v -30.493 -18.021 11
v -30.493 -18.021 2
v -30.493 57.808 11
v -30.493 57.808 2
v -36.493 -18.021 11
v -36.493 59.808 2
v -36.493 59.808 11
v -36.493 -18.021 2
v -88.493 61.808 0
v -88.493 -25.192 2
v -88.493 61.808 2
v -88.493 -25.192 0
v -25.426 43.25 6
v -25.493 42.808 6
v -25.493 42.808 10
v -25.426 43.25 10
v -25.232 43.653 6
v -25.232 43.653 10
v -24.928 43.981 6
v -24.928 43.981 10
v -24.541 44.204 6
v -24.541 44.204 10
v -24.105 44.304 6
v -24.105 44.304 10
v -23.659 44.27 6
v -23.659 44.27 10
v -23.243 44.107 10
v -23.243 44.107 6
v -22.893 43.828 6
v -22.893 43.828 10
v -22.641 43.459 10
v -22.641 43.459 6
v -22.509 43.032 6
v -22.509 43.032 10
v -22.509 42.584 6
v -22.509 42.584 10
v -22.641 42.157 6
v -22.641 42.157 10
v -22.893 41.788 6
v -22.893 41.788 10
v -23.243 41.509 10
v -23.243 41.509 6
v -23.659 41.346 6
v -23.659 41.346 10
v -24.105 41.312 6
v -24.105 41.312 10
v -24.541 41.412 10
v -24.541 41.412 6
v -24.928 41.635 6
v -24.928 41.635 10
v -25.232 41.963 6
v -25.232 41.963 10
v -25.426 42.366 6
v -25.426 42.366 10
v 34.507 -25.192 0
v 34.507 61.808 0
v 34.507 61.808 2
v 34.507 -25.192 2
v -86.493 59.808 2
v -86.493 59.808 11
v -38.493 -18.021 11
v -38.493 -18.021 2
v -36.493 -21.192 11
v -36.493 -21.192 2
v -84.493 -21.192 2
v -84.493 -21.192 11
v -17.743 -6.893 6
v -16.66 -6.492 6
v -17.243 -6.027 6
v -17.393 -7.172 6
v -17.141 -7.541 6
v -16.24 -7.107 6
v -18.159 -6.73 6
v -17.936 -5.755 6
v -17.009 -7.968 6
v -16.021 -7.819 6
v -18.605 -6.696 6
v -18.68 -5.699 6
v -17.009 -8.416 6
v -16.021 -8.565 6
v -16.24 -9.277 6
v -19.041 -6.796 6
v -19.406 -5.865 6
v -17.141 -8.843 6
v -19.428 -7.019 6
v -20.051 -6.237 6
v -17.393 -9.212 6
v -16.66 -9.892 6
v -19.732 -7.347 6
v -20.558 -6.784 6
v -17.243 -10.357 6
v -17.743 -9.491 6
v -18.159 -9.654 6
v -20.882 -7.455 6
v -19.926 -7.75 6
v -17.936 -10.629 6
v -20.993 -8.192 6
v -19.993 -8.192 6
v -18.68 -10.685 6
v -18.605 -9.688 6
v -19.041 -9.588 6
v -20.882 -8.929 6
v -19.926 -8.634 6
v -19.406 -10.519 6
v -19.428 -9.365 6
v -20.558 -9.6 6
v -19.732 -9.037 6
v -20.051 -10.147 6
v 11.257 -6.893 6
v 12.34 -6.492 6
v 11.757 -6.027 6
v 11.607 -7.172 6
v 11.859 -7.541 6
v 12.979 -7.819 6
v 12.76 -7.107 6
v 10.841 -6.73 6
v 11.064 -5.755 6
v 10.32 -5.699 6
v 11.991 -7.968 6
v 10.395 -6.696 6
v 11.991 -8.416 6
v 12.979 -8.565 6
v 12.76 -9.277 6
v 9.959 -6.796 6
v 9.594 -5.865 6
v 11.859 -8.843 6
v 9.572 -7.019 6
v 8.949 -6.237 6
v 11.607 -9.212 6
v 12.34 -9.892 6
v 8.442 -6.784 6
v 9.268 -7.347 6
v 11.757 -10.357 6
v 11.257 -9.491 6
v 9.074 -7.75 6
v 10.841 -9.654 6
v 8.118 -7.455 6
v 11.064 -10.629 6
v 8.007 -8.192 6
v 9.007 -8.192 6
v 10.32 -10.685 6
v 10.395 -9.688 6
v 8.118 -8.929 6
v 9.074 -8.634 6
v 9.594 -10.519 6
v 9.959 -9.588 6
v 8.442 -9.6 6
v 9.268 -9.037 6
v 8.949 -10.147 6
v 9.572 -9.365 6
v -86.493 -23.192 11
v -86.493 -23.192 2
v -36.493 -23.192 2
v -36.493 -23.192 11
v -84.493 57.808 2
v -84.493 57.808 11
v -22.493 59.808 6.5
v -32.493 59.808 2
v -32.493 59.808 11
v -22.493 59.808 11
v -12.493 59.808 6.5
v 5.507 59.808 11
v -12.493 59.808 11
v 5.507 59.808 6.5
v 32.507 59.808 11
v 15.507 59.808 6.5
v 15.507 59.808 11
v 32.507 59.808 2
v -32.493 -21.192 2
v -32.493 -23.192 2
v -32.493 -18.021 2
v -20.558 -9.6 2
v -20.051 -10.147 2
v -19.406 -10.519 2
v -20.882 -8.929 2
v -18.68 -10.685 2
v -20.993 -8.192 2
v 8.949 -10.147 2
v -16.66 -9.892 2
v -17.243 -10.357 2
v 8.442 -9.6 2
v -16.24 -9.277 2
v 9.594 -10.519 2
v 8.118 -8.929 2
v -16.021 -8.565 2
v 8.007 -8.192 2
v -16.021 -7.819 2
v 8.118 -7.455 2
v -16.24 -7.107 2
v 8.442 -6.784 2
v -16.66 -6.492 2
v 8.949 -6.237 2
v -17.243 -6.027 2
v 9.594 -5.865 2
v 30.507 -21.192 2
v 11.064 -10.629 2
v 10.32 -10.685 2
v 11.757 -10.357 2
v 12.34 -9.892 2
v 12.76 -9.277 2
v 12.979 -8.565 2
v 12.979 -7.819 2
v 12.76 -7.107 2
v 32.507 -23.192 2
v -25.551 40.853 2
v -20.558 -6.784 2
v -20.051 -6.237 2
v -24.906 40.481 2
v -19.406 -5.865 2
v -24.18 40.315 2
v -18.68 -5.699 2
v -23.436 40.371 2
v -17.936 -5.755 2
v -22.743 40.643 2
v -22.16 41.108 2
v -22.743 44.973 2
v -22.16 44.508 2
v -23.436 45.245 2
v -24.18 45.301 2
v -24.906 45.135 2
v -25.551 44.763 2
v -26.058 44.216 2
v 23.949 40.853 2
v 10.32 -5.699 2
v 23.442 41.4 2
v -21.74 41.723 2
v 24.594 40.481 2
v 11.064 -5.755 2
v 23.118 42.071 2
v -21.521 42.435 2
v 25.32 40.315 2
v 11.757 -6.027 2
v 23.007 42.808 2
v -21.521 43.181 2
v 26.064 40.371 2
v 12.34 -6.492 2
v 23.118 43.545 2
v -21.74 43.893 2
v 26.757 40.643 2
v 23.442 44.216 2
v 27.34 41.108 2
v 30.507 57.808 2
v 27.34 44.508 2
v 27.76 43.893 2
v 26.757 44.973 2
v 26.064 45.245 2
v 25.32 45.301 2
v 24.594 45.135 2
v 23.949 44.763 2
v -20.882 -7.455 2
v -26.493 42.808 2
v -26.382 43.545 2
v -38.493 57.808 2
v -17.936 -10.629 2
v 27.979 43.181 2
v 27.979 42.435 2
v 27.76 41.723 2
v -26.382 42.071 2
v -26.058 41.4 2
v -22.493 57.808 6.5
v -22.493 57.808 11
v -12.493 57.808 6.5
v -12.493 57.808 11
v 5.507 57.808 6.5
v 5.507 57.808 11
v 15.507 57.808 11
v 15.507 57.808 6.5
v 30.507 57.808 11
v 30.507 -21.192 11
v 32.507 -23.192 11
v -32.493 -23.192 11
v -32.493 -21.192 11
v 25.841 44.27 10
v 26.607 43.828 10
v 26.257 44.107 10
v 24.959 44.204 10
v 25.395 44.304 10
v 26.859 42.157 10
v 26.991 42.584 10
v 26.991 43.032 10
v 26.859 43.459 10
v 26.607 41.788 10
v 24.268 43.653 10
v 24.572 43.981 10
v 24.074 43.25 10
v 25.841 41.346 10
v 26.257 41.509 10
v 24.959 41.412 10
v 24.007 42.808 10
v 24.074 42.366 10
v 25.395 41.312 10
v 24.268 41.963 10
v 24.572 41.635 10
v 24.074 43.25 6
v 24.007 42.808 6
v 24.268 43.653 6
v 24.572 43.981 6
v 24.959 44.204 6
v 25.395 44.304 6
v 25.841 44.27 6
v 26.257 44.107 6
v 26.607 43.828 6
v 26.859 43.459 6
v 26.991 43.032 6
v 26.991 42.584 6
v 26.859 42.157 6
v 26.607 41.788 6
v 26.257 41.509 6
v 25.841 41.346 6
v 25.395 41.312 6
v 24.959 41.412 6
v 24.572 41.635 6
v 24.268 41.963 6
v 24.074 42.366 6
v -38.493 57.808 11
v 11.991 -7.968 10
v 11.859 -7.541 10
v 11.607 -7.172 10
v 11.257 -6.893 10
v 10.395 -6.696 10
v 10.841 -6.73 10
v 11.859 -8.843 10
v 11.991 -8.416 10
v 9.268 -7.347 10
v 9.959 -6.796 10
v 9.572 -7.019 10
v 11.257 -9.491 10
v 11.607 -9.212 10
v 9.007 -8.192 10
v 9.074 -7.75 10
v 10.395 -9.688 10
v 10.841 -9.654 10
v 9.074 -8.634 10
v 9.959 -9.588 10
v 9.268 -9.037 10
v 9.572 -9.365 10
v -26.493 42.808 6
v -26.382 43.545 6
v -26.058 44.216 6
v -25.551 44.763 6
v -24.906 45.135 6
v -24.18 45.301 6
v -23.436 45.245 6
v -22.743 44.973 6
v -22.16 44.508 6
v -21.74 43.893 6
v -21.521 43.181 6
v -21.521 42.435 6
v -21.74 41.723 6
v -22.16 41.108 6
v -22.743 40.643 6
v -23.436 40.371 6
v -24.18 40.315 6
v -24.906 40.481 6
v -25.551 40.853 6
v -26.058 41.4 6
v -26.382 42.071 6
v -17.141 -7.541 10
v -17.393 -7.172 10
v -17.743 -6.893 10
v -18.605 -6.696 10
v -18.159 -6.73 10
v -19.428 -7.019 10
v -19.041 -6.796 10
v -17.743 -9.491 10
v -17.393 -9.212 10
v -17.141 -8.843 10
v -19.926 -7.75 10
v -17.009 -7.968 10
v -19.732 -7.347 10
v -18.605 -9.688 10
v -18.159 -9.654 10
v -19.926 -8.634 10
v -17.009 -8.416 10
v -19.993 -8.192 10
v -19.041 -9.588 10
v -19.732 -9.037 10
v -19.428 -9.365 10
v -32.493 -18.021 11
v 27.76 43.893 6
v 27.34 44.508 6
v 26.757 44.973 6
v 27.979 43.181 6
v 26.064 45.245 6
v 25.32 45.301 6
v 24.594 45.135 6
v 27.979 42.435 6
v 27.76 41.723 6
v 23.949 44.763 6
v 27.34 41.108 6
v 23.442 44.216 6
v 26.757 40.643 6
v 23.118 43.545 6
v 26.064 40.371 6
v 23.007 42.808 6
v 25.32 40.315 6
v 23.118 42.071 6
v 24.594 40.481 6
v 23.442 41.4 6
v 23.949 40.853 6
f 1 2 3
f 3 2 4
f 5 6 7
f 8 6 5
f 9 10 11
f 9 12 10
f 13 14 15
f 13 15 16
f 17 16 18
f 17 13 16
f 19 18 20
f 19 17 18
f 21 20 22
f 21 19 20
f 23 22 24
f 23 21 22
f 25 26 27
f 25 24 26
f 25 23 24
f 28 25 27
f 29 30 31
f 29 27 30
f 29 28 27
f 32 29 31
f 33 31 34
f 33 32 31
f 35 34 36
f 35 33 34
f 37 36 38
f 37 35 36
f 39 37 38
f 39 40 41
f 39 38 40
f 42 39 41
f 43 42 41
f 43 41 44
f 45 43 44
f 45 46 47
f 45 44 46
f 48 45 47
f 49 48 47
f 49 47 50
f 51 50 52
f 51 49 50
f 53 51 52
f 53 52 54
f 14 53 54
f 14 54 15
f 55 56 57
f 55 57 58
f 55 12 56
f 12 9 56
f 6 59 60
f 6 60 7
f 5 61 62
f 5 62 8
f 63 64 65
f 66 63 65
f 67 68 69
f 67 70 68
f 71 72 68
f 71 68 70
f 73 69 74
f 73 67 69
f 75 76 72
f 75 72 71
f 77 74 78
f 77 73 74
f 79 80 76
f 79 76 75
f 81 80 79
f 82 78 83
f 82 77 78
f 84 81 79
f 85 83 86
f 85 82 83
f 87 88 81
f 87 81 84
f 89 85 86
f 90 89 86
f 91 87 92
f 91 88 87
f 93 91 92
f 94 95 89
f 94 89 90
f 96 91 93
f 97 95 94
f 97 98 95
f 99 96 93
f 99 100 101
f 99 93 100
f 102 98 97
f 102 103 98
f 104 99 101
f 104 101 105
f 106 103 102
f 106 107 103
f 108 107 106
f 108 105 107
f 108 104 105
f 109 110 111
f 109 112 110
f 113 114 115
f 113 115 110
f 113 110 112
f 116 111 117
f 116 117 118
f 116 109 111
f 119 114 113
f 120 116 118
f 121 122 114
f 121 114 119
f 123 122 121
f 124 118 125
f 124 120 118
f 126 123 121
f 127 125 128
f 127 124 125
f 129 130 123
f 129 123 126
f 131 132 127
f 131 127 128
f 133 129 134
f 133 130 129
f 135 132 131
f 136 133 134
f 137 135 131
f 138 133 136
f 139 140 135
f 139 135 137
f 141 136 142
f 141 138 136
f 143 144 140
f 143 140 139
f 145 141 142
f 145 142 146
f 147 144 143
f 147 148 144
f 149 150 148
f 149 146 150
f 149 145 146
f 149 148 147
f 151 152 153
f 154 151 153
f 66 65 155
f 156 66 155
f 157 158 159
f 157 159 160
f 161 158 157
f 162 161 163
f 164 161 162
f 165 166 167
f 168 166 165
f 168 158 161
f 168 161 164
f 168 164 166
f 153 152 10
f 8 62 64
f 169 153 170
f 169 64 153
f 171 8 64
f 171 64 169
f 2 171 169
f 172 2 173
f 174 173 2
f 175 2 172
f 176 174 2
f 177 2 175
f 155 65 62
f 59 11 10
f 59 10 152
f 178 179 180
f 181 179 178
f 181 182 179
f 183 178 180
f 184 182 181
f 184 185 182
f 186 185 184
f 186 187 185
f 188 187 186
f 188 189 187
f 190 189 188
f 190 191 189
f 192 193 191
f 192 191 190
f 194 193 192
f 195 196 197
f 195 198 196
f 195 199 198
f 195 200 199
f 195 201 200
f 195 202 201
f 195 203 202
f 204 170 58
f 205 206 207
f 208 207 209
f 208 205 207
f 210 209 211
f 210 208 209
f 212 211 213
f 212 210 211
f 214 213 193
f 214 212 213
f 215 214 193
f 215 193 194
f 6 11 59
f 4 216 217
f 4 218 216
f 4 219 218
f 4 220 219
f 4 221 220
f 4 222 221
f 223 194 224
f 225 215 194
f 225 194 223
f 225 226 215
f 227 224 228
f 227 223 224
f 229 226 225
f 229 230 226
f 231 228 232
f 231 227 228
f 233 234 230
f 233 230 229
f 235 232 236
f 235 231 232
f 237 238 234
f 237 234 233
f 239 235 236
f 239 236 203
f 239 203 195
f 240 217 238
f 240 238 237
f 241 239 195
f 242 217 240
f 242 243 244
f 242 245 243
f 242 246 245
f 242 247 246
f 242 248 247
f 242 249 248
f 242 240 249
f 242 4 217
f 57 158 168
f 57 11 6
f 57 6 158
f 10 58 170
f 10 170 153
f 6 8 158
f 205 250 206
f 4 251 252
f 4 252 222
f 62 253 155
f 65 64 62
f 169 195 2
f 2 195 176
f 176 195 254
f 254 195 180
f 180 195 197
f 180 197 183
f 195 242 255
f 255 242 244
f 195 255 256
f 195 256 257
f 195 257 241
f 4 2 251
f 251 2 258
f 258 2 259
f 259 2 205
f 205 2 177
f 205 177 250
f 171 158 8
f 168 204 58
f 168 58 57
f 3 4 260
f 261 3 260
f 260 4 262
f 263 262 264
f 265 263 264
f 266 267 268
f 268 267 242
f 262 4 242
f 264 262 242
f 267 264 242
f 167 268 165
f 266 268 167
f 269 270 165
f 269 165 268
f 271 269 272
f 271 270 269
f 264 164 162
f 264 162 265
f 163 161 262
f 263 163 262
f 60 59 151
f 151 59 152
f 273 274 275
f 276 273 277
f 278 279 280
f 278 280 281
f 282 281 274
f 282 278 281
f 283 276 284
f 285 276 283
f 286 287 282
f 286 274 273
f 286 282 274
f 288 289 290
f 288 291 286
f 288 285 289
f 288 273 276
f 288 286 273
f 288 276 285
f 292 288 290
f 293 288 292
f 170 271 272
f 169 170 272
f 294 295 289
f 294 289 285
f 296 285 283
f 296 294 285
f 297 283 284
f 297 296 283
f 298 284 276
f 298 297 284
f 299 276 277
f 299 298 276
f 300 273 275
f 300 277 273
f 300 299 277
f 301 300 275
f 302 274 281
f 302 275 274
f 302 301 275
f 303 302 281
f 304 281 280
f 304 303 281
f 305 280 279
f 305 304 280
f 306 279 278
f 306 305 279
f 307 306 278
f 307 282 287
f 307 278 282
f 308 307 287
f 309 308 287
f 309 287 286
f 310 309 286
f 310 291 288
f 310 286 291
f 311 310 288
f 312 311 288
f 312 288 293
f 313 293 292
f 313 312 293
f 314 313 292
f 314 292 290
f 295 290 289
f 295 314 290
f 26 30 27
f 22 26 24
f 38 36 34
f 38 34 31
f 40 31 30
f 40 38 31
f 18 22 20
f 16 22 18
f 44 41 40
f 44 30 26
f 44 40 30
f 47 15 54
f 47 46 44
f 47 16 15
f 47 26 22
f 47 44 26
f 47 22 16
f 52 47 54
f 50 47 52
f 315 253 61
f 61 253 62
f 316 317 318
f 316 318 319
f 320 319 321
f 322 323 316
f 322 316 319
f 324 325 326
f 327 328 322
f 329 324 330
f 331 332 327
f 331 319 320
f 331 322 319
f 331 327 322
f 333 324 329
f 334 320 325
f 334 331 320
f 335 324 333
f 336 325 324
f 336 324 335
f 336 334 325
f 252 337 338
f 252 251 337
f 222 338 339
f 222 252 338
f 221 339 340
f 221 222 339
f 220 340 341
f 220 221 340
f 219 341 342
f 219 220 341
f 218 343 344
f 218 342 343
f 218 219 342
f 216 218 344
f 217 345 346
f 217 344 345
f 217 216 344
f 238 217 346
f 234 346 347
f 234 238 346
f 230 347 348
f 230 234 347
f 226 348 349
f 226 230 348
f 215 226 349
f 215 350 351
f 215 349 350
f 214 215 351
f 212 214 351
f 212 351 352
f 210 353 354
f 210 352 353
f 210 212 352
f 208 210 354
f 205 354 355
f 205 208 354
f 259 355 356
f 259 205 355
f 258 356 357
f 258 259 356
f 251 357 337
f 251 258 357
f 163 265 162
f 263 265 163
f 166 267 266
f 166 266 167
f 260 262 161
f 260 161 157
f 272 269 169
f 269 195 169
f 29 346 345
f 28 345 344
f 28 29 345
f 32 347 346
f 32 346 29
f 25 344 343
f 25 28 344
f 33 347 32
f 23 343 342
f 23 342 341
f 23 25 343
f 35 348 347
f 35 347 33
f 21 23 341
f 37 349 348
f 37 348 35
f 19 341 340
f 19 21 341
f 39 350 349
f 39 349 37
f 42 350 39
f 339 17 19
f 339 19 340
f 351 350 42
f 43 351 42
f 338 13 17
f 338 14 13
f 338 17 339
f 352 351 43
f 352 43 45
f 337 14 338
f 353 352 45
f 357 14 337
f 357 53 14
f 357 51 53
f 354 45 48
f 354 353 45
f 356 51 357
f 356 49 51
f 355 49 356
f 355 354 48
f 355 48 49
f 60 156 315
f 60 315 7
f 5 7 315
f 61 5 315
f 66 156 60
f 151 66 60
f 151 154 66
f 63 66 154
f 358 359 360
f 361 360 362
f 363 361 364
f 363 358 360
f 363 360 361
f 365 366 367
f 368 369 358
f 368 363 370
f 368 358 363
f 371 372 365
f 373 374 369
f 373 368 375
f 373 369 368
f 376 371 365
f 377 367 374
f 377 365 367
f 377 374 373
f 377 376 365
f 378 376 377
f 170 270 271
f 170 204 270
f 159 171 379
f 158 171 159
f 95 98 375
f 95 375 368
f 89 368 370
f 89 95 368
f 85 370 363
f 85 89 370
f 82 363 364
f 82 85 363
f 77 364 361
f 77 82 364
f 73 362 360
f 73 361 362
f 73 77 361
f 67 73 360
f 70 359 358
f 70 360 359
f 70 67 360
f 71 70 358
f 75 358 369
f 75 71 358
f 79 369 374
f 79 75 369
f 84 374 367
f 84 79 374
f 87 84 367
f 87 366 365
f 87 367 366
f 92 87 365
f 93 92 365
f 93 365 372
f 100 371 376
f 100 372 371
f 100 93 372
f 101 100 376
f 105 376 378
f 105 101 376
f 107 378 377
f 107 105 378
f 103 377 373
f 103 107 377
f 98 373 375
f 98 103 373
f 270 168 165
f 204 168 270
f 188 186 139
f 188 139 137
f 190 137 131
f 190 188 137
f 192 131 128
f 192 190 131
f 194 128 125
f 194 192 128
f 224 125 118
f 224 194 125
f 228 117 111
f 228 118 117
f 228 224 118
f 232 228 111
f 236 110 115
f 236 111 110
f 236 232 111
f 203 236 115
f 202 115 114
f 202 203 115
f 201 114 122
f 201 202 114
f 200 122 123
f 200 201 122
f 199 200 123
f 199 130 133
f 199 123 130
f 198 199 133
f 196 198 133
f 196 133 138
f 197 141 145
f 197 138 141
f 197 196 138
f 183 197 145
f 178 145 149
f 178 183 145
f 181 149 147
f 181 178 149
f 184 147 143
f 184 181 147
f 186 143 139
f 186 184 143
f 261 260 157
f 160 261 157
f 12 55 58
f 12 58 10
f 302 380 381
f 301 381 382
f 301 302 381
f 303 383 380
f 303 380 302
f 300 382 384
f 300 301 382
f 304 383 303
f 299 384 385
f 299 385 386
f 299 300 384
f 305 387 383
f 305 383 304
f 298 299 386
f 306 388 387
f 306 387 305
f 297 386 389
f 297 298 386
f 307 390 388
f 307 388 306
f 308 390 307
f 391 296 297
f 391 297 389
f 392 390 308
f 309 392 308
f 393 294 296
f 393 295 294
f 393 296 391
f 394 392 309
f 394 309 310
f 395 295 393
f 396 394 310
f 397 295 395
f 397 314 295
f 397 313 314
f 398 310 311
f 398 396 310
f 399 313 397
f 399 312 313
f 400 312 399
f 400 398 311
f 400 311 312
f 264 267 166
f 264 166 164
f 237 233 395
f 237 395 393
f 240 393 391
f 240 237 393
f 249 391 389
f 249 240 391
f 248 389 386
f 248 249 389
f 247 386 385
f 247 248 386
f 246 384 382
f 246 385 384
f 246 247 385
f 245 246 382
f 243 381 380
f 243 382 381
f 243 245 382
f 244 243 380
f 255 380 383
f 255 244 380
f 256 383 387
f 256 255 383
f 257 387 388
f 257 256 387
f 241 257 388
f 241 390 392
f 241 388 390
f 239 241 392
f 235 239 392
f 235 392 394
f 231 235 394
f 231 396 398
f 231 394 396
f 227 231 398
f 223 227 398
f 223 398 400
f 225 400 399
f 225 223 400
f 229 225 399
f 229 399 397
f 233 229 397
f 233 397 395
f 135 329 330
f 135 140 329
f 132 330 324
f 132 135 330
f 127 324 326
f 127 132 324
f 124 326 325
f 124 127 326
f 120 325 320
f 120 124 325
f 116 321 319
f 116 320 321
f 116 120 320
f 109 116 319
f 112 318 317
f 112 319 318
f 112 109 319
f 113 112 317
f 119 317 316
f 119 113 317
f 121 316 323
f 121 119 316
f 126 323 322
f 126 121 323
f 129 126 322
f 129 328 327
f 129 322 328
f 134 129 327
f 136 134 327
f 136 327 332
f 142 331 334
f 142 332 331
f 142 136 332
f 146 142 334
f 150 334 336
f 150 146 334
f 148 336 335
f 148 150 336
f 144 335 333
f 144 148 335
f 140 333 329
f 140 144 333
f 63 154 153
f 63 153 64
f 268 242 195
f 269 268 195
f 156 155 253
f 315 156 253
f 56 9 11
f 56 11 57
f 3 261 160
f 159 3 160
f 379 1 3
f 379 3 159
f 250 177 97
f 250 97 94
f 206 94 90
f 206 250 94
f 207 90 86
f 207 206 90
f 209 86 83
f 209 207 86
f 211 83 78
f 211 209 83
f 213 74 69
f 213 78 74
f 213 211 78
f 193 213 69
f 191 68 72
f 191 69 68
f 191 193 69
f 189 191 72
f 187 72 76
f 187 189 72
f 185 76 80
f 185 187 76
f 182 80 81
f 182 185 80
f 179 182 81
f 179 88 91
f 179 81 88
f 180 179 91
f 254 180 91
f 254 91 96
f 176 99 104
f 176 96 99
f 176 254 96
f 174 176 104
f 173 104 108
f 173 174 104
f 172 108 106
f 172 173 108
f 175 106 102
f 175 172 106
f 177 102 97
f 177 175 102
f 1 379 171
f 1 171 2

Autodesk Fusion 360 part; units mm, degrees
sketch "Sketch1" plane through (0, 0, 0) normal (0, 0, 1) x (1, 0, 0)
  line L0 (-88.4927, 61.808) -> (34.5073, 61.808)
  line L1 (34.5073, 61.808) -> (34.5073, -25.192)
  line L2 (34.5073, -25.192) -> (-88.4927, -25.192)
  line L3 (-88.4927, -25.192) -> (-88.4927, 61.808)
  dimension "d1" = 123
  dimension "d2" = 87
extrude "Extrude1" add sketch "Sketch1" along normal blind 2
sketch "Sketch2" plane through (0, 0, 2) normal (0, 0, 1) x (-1, 0, 0)
  line L0 (88.4927, 25.192) -> (-34.5073, 25.192)
  line L1 (-34.5073, 25.192) -> (-34.5073, -61.808)
  line L2 (-34.5073, -61.808) -> (88.4927, -61.808)
  line L3 (88.4927, -61.808) -> (88.4927, 25.192)
  line L4 (88.4927, -61.808) -> (88.4927, -59.808)
  line L5 (88.4927, -61.808) -> (86.4927, -61.808)
  line L6 (86.4927, -61.808) -> (86.4927, -59.808)
  line L7 (86.4927, -59.808) -> (36.4927, -59.808)
  line L8 (88.4927, 25.192) -> (86.4927, 25.192)
  line L9 (86.4927, -59.808) -> (86.4927, 23.192)
  line L10 (86.4927, 23.192) -> (36.4927, 23.192)
  line L11 (86.4927, -59.808) -> (84.4927, -59.808)
  line L12 (36.4927, 23.192) -> (36.4927, 21.192)
  line L13 (36.4927, 21.192) -> (38.4927, 21.192)
  line L14 (84.4927, -57.808) -> (38.4927, -57.808)
  line L15 (38.4927, -57.808) -> (38.4927, 18.0206)
  line L16 (38.4927, 21.192) -> (84.4927, 21.192)
  line L17 (84.4927, 21.192) -> (84.4927, -57.808)
  line L18 (38.4927, 18.0206) -> (36.4927, 18.0206)
  line L19 (36.4927, -59.808) -> (36.4927, 18.0206)
  line L20 (36.4927, 21.192) -> (36.4927, 23.192)
  line L21 (-34.5073, 25.192) -> (-34.5073, 23.192)
  line L22 (-34.5073, 23.192) -> (-32.5073, 23.192)
  line L23 (-32.5073, -59.808) -> (-32.5073, 23.192)
  line L24 (-32.5073, 23.192) -> (32.4927, 23.192)
  line L25 (32.4927, -59.808) -> (30.4927, -59.808)
  line L26 (-32.5073, 23.192) -> (-32.5073, 21.192)
  line L27 (-30.5073, -57.808) -> (-30.5073, 21.192)
  line L28 (-30.5073, 21.192) -> (30.4927, 21.192)
  line L29 (30.4927, 18.0206) -> (30.4927, -57.808)
  line L30 (32.4927, 18.0206) -> (30.4927, 18.0206)
  line L31 (30.4927, 21.192) -> (32.4927, 21.192)
  line L32 (32.4927, 23.192) -> (32.4927, 21.192)
  line L33 (32.4927, 18.0206) -> (32.4927, -59.808)
  line L34 (30.4927, -59.808) -> (22.4927, -59.808)
  line L35 (12.4927, -59.808) -> (12.4927, -57.808)
  line L36 (22.4927, -57.808) -> (22.4927, -59.808)
  line L37 (30.4927, -57.808) -> (22.4927, -57.808)
  line L38 (32.4927, -59.808) -> (22.4927, -59.808)
  line L39 (12.4927, -59.808) -> (-32.5073, -59.808)
  line L40 (-32.5073, -59.808) -> (-15.5073, -59.808)
  line L41 (-5.5073, -59.808) -> (-5.5073, -57.808)
  line L42 (-5.5073, -57.808) -> (-15.5073, -57.808)
  line L43 (-15.5073, -57.808) -> (-15.5073, -59.808)
  line L44 (12.4927, -57.808) -> (-5.5073, -57.808)
  line L45 (-15.5073, -57.808) -> (-30.5073, -57.808)
  dimension "d5" = 2
  dimension "d6" = 2
  dimension "d7" = 2
  dimension "d8" = 50
  dimension "d9" = 2
  dimension "d10" = 2
  dimension "d11" = 50
  dimension "d12" = 2
  dimension "d13" = 2
  dimension "d14" = 2
  dimension "d15" = 2
  dimension "d17" = 4
  dimension "d18" = 2
  dimension "d19" = 2
  dimension "d20" = 2
  dimension "d21" = 2
  dimension "d22" = 2
  dimension "d23" = 2
  dimension "d24" = 8
  dimension "d25" = 10
  dimension "d26" = 17
  dimension "d27" = 10
extrude "Extrude2" add sketch "Sketch2" along normal blind 9 contours L23 L24 L26 L27 L28 L31 L32 L39 L40 L43 L45 | L7 L9 L10 L11 L12 L13 L14 L15 L16 L17 L18 L19 L20 | L35 L39 L41 L44 | L25 L29 L30 L33 L34 L36 L37 L38
sketch "Sketch3" plane through (0, 0, 2) normal (0, 0, 1) x (-1, 0, 0)
  line L0 (12.4927, -59.808) -> (-5.5073, -59.808)
  line L1 (-5.5073, -59.808) -> (-5.5073, -57.808)
  line L2 (-5.5073, -57.808) -> (12.4927, -57.808)
  line L3 (12.4927, -57.808) -> (12.4927, -59.808)
  line L4 (36.4927, 21.192) -> (36.4927, 23.192)
  line L5 (36.4927, 23.192) -> (86.4927, 23.192)
  line L6 (86.4927, 23.192) -> (86.4927, -59.808)
  line L7 (86.4927, -59.808) -> (36.4927, -59.808)
  line L8 (36.4927, -59.808) -> (36.4927, 18.0206)
  line L9 (36.4927, 18.0206) -> (38.4927, 18.0206)
  line L10 (38.4927, 18.0206) -> (38.4927, -57.808)
  line L11 (38.4927, -57.808) -> (84.4927, -57.808)
  line L12 (84.4927, -57.808) -> (84.4927, 21.192)
  line L13 (84.4927, 21.192) -> (36.4927, 21.192)
  line L14 (-32.5073, -59.808) -> (-32.5073, 23.192)
  line L15 (-32.5073, 23.192) -> (32.4927, 23.192)
  line L16 (32.4927, 23.192) -> (32.4927, 21.192)
  line L17 (32.4927, 21.192) -> (-30.5073, 21.192)
  line L18 (-30.5073, 21.192) -> (-30.5073, -57.808)
  line L19 (-30.5073, -57.808) -> (-15.5073, -57.808)
  line L20 (-15.5073, -57.808) -> (-15.5073, -59.808)
  line L21 (-15.5073, -59.808) -> (-32.5073, -59.808)
  line L22 (32.4927, 18.0206) -> (32.4927, -59.808)
  line L23 (32.4927, -59.808) -> (22.4927, -59.808)
  line L24 (22.4927, -59.808) -> (22.4927, -57.808)
  line L25 (22.4927, -57.808) -> (30.4927, -57.808)
  line L26 (30.4927, -57.808) -> (30.4927, 18.0206)
  line L27 (30.4927, 18.0206) -> (32.4927, 18.0206)
  line L28 (88.4927, 25.192) -> (-34.5073, 25.192)
  line L29 (-34.5073, 25.192) -> (-34.5073, -61.808)
  line L30 (-34.5073, -61.808) -> (88.4927, -61.808)
  line L31 (88.4927, -61.808) -> (88.4927, 25.192)
  line L32 (-5.5073, -59.808) -> (-15.5073, -59.808)
  line L33 (-15.5073, -59.808) -> (-15.5073, -57.808)
  line L34 (-15.5073, -57.808) -> (-5.5073, -57.808)
  line L35 (-5.5073, -57.808) -> (-5.5073, -59.808)
extrude "Extrude3" add sketch "Sketch3" along normal blind 4.5 contours L1 L20 L32 L33 L34 L35
sketch "Sketch4" plane through (0, 0, 2) normal (0, 0, 1) x (-1, 0, 0)
  line L0 (88.4927, 25.192) -> (-34.5073, 25.192)
  line L1 (-34.5073, 25.192) -> (-34.5073, -61.808)
  line L2 (-34.5073, -61.808) -> (88.4927, -61.808)
  line L3 (88.4927, -61.808) -> (88.4927, 25.192)
  line L4 (32.4927, 18.0206) -> (32.4927, -59.808)
  line L5 (32.4927, -59.808) -> (22.4927, -59.808)
  line L6 (22.4927, -59.808) -> (22.4927, -57.808)
  line L7 (22.4927, -57.808) -> (30.4927, -57.808)
  line L8 (30.4927, -57.808) -> (30.4927, 18.0206)
  line L9 (30.4927, 18.0206) -> (32.4927, 18.0206)
  line L10 (12.4927, -59.808) -> (-32.5073, -59.808)
  line L11 (-32.5073, -59.808) -> (-32.5073, 23.192)
  line L12 (-32.5073, 23.192) -> (32.4927, 23.192)
  line L13 (32.4927, 23.192) -> (32.4927, 21.192)
  line L14 (32.4927, 21.192) -> (-30.5073, 21.192)
  line L15 (-30.5073, 21.192) -> (-30.5073, -57.808)
  line L16 (-30.5073, -57.808) -> (12.4927, -57.808)
  line L17 (12.4927, -57.808) -> (12.4927, -59.808)
  line L18 (36.4927, 21.192) -> (36.4927, 23.192)
  line L19 (36.4927, 23.192) -> (86.4927, 23.192)
  line L20 (86.4927, 23.192) -> (86.4927, -59.808)
  line L21 (86.4927, -59.808) -> (36.4927, -59.808)
  line L22 (36.4927, -59.808) -> (36.4927, 18.0206)
  line L23 (36.4927, 18.0206) -> (38.4927, 18.0206)
  line L24 (38.4927, 18.0206) -> (38.4927, -57.808)
  line L25 (38.4927, -57.808) -> (84.4927, -57.808)
  line L26 (84.4927, -57.808) -> (84.4927, 21.192)
  line L27 (84.4927, 21.192) -> (36.4927, 21.192)
  circle A0 centre (23.9927, -42.808) radius 2.5
  circle A1 centre (-25.5073, -42.808) radius 2.5
  circle A2 centre (-10.5073, 8.192) radius 2.5
  circle A3 centre (18.4927, 8.192) radius 2.5
  dimension "d34" = 5
  dimension "d36" = 5
  dimension "d39" = 5
  dimension "d41" = 5
extrude "Extrude4" add sketch "Sketch4" along normal blind 4 contours A0 | A1 | A2 | A3
sketch "Sketch5" plane through (0, 0, 6) normal (0, 0, 1) x (-1, 0, 0)
  circle A0 centre (23.9927, -42.808) radius 2.5
  circle A1 centre (23.9927, -42.808) radius 1.5
  dimension "d44" = 3
extrude "Extrude5" add sketch "Sketch5" along normal blind 4 contours A1
sketch "Sketch6" plane through (0, 0, 6) normal (0, 0, 1) x (-1, 0, 0)
  circle A0 centre (-25.5073, -42.808) radius 2.5
  circle A1 centre (-25.5073, -42.808) radius 1.5
  dimension "d47" = 3
extrude "Extrude6" add sketch "Sketch6" along normal blind 4 contours A1
sketch "Sketch7" plane through (0, 0, 6) normal (0, 0, 1) x (-1, 0, 0)
  circle A0 centre (18.4927, 8.192) radius 2.5
  circle A1 centre (18.4927, 8.192) radius 1.5
  dimension "d50" = 3
extrude "Extrude7" add sketch "Sketch7" along normal blind 4 contours A1
sketch "Sketch8" plane through (0, 0, 6) normal (0, 0, 1) x (-1, 0, 0)
  circle A0 centre (-10.5073, 8.192) radius 2.5
  circle A1 centre (-10.5073, 8.192) radius 1.5
  dimension "d53" = 3
extrude "Extrude8" add sketch "Sketch8" along normal blind 4 contours A1
sketch "Sketch9" plane through (0, 0, 2) normal (0, 0, 1) x (-1, 0, 0)
  circle A0 centre (18.4927, 8.192) radius 2.5
  circle A1 centre (23.9927, -42.808) radius 2.5
  circle A2 centre (-10.5073, 8.192) radius 2.5
  circle A3 centre (-25.5073, -42.808) radius 2.5
  line L0 (88.4927, 25.192) -> (-34.5073, 25.192)
  line L1 (-34.5073, 25.192) -> (-34.5073, -61.808)
  line L2 (-34.5073, -61.808) -> (88.4927, -61.808)
  line L3 (88.4927, -61.808) -> (88.4927, 25.192)
  line L4 (32.4927, 18.0206) -> (32.4927, -59.808)
  line L5 (32.4927, -59.808) -> (22.4927, -59.808)
  line L6 (22.4927, -59.808) -> (22.4927, -57.808)
  line L7 (22.4927, -57.808) -> (30.4927, -57.808)
  line L8 (30.4927, -57.808) -> (30.4927, 18.0206)
  line L9 (30.4927, 18.0206) -> (32.4927, 18.0206)
  line L10 (12.4927, -59.808) -> (-32.5073, -59.808)
  line L11 (-32.5073, -59.808) -> (-32.5073, 23.192)
  line L12 (-32.5073, 23.192) -> (32.4927, 23.192)
  line L13 (32.4927, 23.192) -> (32.4927, 21.192)
  line L14 (32.4927, 21.192) -> (-30.5073, 21.192)
  line L15 (-30.5073, 21.192) -> (-30.5073, -57.808)
  line L16 (-30.5073, -57.808) -> (12.4927, -57.808)
  line L17 (12.4927, -57.808) -> (12.4927, -59.808)
  line L18 (36.4927, 21.192) -> (36.4927, 23.192)
  line L19 (36.4927, 23.192) -> (86.4927, 23.192)
  line L20 (86.4927, 23.192) -> (86.4927, -59.808)
  line L21 (86.4927, -59.808) -> (36.4927, -59.808)
  line L22 (36.4927, -59.808) -> (36.4927, 18.0206)
  line L23 (36.4927, 18.0206) -> (38.4927, 18.0206)
  line L24 (38.4927, 18.0206) -> (38.4927, -57.808)
  line L25 (38.4927, -57.808) -> (84.4927, -57.808)
  line L26 (84.4927, -57.808) -> (84.4927, 21.192)
  line L27 (84.4927, 21.192) -> (36.4927, 21.192)
  line L28 (22.4927, -59.808) -> (12.4927, -59.808)
  line L29 (12.4927, -59.808) -> (12.4927, -57.808)
  line L30 (12.4927, -57.808) -> (22.4927, -57.808)
  line L31 (22.4927, -57.808) -> (22.4927, -59.808)
extrude "Extrude9" add sketch "Sketch9" along normal blind 4.5 contours L6 L17 L28 L29 L30 L31
